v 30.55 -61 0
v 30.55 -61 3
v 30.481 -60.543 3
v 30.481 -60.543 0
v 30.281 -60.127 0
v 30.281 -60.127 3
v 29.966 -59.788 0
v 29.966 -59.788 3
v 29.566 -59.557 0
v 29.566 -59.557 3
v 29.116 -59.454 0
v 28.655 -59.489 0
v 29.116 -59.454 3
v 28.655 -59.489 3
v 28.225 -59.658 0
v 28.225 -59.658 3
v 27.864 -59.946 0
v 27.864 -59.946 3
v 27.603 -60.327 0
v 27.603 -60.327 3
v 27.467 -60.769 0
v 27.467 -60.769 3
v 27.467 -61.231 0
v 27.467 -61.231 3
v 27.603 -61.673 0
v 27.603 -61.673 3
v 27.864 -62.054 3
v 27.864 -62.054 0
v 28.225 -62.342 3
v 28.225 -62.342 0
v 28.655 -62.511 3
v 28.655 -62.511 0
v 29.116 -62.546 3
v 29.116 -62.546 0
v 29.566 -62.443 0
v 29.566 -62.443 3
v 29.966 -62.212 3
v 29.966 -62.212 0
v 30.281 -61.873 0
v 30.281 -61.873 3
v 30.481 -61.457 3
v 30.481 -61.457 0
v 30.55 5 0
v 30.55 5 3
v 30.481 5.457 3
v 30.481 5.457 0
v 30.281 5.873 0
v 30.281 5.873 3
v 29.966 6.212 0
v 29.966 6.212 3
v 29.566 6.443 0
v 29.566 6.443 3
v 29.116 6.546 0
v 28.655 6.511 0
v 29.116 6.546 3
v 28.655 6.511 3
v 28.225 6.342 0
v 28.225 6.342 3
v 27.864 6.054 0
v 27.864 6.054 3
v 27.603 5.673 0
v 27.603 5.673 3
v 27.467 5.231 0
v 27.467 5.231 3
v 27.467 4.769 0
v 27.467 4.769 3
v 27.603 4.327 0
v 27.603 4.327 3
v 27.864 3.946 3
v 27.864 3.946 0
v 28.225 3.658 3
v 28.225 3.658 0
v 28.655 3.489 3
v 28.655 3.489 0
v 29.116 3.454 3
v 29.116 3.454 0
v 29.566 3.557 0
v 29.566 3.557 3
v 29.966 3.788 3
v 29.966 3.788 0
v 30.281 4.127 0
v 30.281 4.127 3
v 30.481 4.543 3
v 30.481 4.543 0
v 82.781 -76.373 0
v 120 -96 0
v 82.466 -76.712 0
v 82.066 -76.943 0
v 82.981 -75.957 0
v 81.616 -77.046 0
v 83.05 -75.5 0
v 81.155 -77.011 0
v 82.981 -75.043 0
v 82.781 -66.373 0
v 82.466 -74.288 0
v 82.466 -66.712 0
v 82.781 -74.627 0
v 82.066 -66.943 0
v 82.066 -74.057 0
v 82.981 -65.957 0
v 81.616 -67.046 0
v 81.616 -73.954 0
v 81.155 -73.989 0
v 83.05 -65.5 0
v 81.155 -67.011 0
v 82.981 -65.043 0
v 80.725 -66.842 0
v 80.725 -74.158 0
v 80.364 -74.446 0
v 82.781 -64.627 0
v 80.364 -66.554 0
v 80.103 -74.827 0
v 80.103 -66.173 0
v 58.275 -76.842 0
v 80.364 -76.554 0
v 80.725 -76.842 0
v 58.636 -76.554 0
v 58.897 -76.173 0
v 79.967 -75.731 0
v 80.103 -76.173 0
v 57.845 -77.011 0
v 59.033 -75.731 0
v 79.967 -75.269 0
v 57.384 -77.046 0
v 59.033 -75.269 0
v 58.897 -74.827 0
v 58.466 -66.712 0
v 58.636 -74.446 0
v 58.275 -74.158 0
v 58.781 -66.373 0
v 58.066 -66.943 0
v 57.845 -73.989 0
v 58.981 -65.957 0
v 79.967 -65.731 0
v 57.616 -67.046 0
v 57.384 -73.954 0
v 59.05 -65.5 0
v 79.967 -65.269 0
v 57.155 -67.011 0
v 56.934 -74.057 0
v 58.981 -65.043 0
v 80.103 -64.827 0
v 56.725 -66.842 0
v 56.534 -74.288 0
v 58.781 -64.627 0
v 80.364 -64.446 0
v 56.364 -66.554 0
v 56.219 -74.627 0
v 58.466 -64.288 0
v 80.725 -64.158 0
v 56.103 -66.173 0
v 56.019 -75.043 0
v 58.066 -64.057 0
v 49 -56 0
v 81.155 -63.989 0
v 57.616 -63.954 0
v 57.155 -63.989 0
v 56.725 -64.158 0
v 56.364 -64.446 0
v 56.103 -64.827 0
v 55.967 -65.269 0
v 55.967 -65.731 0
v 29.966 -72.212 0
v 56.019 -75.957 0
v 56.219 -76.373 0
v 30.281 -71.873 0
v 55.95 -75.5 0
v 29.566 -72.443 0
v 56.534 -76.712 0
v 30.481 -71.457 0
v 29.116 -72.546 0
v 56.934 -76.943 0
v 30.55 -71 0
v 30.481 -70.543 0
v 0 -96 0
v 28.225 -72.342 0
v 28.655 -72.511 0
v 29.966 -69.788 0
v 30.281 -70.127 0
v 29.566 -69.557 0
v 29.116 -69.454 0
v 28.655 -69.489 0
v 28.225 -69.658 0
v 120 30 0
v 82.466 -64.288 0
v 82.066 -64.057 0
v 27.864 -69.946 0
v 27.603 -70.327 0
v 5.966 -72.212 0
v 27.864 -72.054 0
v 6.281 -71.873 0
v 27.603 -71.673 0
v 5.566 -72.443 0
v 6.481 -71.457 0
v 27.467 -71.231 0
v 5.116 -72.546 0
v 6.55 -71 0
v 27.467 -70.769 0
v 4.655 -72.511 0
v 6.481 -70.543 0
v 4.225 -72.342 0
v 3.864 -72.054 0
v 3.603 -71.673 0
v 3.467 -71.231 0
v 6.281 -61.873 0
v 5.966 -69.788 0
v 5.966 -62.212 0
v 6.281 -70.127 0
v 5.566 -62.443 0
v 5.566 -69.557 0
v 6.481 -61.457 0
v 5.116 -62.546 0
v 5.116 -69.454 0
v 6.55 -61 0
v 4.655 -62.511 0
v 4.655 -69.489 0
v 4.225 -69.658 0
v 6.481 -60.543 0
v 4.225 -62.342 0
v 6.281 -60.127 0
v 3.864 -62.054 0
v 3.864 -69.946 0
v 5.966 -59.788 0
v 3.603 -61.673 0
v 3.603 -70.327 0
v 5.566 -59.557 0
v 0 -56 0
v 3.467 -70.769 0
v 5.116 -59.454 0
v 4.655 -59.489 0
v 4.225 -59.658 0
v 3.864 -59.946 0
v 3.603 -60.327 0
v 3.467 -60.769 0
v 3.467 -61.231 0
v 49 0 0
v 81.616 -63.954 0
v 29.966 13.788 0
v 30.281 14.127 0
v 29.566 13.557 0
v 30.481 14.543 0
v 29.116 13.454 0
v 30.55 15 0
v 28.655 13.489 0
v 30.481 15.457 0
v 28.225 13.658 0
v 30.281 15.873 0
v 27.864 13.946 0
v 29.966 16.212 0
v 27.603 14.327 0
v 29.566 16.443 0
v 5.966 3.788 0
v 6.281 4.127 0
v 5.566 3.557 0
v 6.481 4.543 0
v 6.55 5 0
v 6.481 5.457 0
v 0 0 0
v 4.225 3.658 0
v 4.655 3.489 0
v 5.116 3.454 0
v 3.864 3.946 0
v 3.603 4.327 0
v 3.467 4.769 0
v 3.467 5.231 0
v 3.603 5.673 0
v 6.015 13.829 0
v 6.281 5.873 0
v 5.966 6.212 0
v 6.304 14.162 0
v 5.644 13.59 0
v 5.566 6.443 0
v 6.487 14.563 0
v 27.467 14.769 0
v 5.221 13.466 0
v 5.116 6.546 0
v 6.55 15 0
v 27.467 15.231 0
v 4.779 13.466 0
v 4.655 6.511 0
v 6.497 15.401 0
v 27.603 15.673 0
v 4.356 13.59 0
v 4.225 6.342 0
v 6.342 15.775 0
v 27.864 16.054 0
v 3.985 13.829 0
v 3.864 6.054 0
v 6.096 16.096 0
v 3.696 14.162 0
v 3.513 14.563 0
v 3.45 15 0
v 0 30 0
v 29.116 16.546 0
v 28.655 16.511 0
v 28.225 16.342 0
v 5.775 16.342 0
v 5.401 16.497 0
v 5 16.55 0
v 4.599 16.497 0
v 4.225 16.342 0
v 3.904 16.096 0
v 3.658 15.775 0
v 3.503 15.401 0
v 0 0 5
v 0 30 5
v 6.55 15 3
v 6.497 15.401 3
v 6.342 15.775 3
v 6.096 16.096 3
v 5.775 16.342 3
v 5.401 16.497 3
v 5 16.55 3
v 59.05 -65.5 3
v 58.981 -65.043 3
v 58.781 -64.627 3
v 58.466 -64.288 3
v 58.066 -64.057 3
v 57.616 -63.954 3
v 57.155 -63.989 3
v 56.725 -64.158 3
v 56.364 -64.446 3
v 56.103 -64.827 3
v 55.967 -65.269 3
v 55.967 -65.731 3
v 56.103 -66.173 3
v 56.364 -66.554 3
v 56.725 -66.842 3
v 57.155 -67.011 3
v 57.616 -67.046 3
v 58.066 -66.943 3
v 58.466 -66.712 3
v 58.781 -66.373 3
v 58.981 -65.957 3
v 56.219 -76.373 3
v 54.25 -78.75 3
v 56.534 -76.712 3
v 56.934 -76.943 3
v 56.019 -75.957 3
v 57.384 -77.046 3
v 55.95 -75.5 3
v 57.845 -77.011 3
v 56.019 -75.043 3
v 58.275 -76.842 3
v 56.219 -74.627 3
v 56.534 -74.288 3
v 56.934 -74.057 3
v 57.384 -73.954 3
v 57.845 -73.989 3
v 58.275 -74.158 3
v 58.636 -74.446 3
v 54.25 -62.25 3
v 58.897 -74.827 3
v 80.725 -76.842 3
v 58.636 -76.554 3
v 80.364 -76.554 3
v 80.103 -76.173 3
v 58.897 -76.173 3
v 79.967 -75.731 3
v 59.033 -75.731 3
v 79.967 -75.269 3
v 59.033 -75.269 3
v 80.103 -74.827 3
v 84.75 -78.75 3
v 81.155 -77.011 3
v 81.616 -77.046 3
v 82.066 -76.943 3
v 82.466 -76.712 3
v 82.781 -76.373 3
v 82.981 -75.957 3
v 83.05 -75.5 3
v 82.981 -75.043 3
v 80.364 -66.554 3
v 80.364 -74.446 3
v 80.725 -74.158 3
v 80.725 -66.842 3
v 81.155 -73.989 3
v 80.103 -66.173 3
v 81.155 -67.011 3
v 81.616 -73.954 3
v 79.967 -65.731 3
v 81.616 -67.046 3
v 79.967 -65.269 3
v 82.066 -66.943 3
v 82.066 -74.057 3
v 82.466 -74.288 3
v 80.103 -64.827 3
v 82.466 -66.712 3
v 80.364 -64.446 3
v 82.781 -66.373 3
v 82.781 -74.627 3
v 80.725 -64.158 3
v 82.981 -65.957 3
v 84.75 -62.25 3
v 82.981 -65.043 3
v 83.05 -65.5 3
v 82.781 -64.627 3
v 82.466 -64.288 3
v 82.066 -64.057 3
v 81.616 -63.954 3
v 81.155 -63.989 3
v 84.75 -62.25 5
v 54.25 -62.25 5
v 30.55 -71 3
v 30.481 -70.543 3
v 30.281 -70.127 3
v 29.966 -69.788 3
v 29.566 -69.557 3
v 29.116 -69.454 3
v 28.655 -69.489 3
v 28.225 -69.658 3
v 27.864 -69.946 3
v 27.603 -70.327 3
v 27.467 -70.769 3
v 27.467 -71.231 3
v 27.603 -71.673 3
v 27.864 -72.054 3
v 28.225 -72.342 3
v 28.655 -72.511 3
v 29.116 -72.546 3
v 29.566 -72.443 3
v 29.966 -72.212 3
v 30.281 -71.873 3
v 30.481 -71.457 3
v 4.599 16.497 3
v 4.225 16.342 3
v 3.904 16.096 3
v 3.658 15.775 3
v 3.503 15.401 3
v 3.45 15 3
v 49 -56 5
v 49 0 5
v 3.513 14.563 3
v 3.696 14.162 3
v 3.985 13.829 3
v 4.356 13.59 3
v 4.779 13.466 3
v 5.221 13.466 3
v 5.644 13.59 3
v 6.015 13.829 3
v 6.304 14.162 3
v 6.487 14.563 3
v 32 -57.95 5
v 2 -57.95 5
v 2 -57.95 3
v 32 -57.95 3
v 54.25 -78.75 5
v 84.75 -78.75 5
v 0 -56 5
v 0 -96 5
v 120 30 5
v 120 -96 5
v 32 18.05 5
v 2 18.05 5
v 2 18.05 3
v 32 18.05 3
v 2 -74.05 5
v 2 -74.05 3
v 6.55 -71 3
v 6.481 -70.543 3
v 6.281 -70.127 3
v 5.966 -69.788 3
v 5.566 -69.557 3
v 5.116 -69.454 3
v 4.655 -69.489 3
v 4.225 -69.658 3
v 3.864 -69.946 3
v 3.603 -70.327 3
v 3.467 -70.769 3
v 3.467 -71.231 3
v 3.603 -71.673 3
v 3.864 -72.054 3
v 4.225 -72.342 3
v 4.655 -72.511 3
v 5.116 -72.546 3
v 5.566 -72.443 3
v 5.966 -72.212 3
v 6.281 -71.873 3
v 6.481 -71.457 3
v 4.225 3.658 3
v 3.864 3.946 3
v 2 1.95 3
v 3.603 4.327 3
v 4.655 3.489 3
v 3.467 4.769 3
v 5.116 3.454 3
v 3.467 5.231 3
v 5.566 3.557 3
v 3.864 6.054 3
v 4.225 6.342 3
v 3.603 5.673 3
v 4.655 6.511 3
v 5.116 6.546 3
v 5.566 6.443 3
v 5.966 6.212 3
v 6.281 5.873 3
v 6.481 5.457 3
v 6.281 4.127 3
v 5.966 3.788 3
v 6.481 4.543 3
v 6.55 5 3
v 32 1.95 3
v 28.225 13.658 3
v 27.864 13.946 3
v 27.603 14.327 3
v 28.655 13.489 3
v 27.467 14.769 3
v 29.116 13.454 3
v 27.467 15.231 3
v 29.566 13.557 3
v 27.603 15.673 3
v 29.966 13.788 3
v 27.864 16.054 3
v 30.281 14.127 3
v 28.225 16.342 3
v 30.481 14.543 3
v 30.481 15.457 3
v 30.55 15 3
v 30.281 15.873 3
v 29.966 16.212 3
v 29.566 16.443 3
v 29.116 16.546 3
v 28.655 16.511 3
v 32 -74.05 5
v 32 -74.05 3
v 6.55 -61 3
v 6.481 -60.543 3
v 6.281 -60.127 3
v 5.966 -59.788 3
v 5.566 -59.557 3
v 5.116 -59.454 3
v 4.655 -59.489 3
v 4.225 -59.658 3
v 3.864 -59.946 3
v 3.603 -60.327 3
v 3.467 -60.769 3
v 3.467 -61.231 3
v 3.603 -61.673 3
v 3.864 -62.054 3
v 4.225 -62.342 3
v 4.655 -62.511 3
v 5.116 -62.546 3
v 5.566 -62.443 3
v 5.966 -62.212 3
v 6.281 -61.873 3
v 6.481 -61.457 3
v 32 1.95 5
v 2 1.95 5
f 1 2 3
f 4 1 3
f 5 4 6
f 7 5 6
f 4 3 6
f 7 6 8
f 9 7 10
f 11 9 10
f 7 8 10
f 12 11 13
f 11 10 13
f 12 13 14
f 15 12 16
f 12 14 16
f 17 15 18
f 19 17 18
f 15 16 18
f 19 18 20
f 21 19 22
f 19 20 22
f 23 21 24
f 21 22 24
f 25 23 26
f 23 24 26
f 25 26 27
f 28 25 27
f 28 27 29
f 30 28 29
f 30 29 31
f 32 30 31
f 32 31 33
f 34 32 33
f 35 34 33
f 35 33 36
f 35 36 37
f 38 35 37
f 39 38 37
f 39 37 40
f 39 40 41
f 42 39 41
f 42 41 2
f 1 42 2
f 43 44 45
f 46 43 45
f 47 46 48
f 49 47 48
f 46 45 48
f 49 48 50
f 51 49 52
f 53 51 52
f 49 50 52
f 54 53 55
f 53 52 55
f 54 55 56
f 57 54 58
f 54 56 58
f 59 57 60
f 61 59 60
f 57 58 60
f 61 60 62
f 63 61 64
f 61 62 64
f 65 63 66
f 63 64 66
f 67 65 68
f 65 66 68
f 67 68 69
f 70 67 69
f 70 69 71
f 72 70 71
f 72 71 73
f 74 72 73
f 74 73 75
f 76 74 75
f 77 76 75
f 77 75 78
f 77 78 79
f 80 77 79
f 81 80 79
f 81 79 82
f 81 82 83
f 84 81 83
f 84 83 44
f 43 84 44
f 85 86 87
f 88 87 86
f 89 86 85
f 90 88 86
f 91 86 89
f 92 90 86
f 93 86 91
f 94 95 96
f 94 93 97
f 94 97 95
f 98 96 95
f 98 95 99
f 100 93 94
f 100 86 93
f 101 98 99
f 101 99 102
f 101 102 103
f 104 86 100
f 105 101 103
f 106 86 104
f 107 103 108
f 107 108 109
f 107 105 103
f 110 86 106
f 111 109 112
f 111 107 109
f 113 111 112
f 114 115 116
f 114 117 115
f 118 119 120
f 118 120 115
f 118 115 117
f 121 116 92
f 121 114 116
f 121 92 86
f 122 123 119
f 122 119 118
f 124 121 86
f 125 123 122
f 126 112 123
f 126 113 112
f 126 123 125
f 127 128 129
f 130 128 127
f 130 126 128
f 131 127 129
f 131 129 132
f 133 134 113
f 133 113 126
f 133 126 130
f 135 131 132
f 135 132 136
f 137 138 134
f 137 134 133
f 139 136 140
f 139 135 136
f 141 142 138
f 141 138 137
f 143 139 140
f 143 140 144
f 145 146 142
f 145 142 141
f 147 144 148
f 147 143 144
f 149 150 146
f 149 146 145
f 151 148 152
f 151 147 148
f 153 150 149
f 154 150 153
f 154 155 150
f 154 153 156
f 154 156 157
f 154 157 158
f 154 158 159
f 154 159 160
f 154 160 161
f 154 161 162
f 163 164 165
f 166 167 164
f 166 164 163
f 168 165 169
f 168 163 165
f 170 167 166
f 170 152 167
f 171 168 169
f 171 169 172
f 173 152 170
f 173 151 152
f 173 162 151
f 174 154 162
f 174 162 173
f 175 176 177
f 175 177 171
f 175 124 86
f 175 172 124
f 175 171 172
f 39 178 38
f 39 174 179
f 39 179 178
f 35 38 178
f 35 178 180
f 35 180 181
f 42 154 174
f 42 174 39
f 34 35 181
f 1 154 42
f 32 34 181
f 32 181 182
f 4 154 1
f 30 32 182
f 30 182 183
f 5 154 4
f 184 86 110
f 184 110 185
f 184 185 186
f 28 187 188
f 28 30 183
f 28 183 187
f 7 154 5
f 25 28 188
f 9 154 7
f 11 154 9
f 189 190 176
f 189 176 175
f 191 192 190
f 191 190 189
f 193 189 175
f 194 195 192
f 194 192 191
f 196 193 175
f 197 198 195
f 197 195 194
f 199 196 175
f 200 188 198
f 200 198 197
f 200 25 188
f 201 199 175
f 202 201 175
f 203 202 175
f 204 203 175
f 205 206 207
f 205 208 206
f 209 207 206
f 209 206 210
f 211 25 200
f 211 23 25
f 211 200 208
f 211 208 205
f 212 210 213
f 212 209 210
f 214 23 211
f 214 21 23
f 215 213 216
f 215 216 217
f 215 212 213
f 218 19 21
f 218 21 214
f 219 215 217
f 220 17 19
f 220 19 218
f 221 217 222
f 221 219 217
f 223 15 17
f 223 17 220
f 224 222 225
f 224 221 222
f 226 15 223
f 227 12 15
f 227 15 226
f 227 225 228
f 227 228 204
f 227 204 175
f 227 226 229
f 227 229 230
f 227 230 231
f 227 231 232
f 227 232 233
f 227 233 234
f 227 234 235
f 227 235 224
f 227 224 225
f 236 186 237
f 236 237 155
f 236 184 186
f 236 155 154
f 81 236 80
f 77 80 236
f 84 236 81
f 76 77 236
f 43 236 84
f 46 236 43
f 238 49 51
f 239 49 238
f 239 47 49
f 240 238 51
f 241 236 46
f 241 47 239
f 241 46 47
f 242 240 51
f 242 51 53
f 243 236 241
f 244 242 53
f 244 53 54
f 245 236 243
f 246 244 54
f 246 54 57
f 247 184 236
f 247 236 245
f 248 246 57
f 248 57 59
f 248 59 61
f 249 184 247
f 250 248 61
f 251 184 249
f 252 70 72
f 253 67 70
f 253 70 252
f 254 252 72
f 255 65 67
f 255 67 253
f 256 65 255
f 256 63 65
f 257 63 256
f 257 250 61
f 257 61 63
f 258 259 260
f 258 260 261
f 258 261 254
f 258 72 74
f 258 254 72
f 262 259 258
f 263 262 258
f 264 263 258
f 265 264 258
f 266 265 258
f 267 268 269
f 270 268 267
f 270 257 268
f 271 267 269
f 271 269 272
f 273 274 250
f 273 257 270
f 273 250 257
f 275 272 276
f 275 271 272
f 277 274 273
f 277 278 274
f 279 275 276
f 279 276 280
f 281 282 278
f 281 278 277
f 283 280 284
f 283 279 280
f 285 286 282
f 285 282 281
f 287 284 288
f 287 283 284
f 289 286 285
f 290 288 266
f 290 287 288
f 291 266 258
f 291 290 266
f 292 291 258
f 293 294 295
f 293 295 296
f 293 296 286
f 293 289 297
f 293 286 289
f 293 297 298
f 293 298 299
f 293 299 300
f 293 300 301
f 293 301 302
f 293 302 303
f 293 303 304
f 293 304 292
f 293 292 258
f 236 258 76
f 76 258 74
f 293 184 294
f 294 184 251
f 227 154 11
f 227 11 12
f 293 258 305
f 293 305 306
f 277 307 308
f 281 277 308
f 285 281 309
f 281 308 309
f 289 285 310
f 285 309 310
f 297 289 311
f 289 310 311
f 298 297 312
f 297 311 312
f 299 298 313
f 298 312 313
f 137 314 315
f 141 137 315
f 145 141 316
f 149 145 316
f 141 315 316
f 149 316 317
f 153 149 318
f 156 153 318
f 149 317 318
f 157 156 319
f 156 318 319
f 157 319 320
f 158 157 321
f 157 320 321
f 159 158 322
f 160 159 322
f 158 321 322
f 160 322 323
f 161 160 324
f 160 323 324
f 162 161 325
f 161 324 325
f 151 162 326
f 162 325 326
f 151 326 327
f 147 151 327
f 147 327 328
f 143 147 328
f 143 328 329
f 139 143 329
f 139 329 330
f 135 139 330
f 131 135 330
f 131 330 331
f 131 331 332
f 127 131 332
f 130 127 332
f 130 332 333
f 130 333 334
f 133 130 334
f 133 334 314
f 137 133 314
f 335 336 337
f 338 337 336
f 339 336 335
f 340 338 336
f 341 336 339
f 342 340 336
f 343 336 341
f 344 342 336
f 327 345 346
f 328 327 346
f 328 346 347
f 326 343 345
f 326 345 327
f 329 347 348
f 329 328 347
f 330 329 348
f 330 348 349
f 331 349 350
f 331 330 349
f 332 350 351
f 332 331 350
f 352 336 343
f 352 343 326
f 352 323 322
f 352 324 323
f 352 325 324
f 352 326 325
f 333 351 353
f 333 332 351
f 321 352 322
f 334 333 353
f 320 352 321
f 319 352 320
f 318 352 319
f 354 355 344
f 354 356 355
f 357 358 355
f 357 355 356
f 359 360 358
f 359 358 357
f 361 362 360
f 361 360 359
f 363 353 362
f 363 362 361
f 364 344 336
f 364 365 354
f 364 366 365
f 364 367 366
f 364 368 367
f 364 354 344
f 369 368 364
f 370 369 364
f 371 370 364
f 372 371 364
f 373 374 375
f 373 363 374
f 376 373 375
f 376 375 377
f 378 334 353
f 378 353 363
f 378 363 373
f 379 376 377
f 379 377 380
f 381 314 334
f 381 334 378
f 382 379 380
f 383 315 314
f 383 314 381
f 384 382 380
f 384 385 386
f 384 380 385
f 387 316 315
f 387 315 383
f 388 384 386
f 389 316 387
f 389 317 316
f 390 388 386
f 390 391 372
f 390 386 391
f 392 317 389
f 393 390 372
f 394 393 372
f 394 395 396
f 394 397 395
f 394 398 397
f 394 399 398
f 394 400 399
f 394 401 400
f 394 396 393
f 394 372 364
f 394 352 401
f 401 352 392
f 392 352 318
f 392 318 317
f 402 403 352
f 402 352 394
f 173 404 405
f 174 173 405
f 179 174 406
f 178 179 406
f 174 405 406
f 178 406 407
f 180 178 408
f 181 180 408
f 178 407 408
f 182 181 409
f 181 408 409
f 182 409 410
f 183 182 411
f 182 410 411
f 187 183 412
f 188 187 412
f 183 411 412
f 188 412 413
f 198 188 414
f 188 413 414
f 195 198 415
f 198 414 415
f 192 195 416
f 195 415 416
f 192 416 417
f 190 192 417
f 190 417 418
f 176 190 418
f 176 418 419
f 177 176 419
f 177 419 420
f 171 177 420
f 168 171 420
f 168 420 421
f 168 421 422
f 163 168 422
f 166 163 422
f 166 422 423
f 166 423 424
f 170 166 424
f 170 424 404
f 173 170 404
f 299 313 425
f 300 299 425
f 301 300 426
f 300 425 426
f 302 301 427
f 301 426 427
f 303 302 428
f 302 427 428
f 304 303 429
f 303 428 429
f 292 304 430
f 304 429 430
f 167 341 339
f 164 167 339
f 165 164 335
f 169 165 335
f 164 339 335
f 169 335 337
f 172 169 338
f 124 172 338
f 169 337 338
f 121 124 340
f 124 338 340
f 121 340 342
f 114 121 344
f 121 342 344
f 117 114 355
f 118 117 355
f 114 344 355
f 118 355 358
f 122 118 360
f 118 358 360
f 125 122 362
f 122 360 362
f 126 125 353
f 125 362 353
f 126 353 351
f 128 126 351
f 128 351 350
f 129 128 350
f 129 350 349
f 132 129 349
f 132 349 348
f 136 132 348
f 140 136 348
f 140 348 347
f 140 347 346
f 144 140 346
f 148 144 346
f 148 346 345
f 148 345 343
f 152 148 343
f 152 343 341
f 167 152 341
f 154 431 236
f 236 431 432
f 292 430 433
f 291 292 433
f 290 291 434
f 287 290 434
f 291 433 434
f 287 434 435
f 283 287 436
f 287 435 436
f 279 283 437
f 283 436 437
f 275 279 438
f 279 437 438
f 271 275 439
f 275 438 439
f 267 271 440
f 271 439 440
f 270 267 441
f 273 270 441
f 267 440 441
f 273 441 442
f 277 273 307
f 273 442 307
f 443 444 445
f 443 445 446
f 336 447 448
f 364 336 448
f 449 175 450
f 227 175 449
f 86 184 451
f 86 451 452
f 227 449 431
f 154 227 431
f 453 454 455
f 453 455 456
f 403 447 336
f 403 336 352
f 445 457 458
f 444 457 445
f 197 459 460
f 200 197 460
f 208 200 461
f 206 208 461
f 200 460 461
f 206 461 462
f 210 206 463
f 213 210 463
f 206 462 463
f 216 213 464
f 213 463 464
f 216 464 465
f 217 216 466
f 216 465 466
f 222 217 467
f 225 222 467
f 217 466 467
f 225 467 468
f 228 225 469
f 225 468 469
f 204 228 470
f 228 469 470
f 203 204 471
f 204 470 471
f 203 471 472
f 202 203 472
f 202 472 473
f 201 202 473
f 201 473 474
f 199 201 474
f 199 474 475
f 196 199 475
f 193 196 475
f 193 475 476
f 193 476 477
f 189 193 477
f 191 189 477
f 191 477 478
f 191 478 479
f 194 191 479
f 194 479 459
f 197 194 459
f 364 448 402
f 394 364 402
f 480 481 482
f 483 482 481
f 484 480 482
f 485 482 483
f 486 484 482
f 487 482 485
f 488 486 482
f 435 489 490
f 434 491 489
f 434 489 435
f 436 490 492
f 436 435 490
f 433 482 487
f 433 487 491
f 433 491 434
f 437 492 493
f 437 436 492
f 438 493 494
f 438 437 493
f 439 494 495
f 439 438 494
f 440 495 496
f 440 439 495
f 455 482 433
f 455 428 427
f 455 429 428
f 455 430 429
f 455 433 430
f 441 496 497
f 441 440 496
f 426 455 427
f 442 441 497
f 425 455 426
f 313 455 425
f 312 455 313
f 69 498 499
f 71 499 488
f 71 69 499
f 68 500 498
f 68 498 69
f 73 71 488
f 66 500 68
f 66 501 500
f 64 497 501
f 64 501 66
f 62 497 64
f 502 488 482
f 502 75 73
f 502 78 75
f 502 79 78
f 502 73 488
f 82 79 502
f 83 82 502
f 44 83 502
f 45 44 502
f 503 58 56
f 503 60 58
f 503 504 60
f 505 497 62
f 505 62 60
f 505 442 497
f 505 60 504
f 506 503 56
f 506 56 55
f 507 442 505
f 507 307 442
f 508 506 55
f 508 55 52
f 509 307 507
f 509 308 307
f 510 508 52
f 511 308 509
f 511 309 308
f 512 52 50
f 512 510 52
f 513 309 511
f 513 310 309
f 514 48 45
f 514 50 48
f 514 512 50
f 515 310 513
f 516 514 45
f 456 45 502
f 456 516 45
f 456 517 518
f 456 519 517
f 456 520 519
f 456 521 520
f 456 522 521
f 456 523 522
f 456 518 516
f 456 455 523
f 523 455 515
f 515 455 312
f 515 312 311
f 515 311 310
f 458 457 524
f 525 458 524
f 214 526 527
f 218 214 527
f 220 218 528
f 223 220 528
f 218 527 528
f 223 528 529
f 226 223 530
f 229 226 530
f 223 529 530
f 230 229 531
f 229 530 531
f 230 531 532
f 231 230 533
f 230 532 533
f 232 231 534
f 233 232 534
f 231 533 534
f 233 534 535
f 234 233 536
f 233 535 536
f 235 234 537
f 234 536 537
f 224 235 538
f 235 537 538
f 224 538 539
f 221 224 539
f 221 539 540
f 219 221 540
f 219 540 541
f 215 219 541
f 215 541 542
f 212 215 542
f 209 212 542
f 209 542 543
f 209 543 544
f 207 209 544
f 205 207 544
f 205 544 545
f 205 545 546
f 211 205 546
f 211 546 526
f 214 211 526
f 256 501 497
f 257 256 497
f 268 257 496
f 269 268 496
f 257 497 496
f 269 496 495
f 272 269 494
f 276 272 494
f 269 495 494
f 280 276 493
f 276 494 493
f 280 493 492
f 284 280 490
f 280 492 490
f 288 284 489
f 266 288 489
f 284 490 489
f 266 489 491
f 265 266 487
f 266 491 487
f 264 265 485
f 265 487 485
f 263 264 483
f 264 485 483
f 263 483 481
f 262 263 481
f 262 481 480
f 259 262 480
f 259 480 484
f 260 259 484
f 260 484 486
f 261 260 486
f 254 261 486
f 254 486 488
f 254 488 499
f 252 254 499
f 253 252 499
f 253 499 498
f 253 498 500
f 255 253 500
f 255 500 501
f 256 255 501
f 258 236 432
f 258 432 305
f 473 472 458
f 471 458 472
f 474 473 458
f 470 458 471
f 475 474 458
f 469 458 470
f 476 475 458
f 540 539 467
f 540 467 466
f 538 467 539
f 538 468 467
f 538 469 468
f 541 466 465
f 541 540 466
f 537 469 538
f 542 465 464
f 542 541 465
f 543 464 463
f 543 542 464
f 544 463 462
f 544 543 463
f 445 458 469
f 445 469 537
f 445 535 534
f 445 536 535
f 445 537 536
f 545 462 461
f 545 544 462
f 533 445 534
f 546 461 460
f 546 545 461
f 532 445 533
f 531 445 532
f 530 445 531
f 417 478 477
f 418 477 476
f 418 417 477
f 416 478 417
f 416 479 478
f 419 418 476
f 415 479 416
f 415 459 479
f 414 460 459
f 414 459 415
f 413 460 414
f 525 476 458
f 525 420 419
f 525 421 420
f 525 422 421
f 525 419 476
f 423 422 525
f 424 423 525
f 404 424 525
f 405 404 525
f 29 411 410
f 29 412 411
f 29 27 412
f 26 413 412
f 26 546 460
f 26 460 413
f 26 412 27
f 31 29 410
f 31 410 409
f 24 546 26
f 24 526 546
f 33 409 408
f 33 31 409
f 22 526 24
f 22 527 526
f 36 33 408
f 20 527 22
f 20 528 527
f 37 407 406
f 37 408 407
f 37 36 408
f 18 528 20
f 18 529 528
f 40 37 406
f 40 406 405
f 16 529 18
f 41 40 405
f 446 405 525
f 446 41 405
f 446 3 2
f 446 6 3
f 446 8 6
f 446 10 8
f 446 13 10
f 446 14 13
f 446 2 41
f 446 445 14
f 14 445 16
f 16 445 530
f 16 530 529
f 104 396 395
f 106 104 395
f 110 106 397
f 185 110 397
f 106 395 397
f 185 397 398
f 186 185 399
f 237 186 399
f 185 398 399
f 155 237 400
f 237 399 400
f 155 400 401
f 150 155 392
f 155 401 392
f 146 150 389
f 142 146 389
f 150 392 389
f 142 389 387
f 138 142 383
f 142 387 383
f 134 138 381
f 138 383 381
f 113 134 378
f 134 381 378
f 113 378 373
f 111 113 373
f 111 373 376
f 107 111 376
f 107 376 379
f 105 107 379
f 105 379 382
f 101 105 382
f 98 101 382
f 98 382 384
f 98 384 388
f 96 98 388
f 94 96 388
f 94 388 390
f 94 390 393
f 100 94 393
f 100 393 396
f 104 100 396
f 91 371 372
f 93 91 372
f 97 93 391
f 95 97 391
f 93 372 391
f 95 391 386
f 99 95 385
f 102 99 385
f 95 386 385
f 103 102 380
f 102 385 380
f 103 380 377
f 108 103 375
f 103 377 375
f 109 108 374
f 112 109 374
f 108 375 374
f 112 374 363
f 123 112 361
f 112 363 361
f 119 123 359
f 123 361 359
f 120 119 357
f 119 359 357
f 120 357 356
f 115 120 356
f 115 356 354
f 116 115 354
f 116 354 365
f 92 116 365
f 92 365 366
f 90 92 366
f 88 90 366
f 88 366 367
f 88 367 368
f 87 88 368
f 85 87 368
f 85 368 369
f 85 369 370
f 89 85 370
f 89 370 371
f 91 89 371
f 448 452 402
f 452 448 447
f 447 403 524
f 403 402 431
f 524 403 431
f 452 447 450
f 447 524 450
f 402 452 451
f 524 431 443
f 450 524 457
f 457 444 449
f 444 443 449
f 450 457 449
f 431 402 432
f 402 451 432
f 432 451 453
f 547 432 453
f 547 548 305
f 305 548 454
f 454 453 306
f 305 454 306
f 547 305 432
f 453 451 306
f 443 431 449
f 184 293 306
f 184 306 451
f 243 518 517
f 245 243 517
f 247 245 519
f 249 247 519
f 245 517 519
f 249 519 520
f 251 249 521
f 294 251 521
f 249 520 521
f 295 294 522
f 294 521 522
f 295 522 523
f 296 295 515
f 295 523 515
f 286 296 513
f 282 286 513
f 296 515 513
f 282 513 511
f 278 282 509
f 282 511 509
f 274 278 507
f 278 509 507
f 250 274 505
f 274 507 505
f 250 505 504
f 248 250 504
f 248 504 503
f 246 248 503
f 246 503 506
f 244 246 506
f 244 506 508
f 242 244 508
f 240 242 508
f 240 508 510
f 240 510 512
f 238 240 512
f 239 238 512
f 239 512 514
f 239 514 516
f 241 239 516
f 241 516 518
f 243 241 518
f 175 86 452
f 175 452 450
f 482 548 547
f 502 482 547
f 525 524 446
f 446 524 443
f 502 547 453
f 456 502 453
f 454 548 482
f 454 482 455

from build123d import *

# Parameters (mm, degrees)
EXTRUDE_2_DEPTH     = 5
SKETCH_3_W          = 30
SKETCH_3_H          = 16.1
CUT_EXTRUDE_1_DEPTH = 2
CUT_EXTRUDE_2_REACH = 155.704
SKETCH_4_R          = 1.55
CUT_EXTRUDE_3_REACH = 155.756
SKETCH_5_W          = 32
SKETCH_5_H          = 56
SKETCH_7_W          = 40.5
SKETCH_7_H          = 40.5
EXTRUDE_4_DEPTH     = 2
SKETCH_8_W          = 30.5
SKETCH_8_H          = 16.5
CUT_EXTRUDE_4_DEPTH = 2
SKETCH_9_R          = 1.55
CUT_EXTRUDE_6_DEPTH = 154.727030805
SKETCH_10_W         = 60
SKETCH_10_H         = 45
EXTRUDE_5_DEPTH     = 2
SKETCH_11_W         = 60
SKETCH_11_H         = 45
CUT_EXTRUDE_8_DEPTH = 2


with BuildPart() as part:
    # 草图1 → 凸台-拉伸2 (new body)
    with BuildSketch(Plane.XY):
        Polygon((0, 0), (0, 30), (120, 30), (120, -96), (0, -96), (0, -56), (45, -56), (45, 0), align=None)
    extrude(amount=EXTRUDE_2_DEPTH)

    # 草图3 → 切除-拉伸1 (cut)
    with BuildSketch(Plane.XY.offset(5)):
        with Locations((17, 10)):
            Rectangle(SKETCH_3_W, SKETCH_3_H)
        with Locations((17, -66)):
            Rectangle(SKETCH_3_W, SKETCH_3_H)
    extrude(amount=-CUT_EXTRUDE_1_DEPTH, mode=Mode.SUBTRACT)

    # 草图4 → 切除-拉伸2 (cut, up to next)
    with BuildSketch(Plane.XY.offset(3), mode=Mode.PRIVATE) as cut_extrude_2_sk1:
        with Locations((29, 15)):
            Circle(SKETCH_4_R)
    cut_extrude_2_tool1 = extrude(cut_extrude_2_sk1.sketch, amount=-CUT_EXTRUDE_2_REACH, mode=Mode.PRIVATE) & part.part
    # 草图4 → 切除-拉伸2 (cut, up to next)
    with BuildSketch(Plane.XY.offset(3), mode=Mode.PRIVATE) as cut_extrude_2_sk2:
        with Locations((29, 5)):
            Circle(SKETCH_4_R)
    cut_extrude_2_tool2 = extrude(cut_extrude_2_sk2.sketch, amount=-CUT_EXTRUDE_2_REACH, mode=Mode.PRIVATE) & part.part
    # 草图4 → 切除-拉伸2 (cut, up to next)
    with BuildSketch(Plane.XY.offset(3), mode=Mode.PRIVATE) as cut_extrude_2_sk3:
        with BuildLine():
            ThreePointArc((5, 16.55), (3.903984489, 16.096015511), (3.45, 15))
            Line((3.45, 15), (5, 15))
            Line((5, 15), (5, 16.55))
        make_face()
    cut_extrude_2_tool3 = extrude(cut_extrude_2_sk3.sketch, amount=-CUT_EXTRUDE_2_REACH, mode=Mode.PRIVATE) & part.part
    # 草图4 → 切除-拉伸2 (cut, up to next)
    with BuildSketch(Plane.XY.offset(3), mode=Mode.PRIVATE) as cut_extrude_2_sk4:
        with BuildLine():
            Line((5, 15), (3.45, 15))
            ThreePointArc((3.45, 15), (5, 13.45), (6.55, 15))
            ThreePointArc((6.55, 15), (6.096015511, 16.096015511), (5, 16.55))
            Line((5, 16.55), (5, 15))
        make_face()
    cut_extrude_2_tool4 = extrude(cut_extrude_2_sk4.sketch, amount=-CUT_EXTRUDE_2_REACH, mode=Mode.PRIVATE) & part.part
    # 草图4 → 切除-拉伸2 (cut, up to next)
    with BuildSketch(Plane.XY.offset(3), mode=Mode.PRIVATE) as cut_extrude_2_sk5:
        with BuildLine():
            ThreePointArc((5, 16.55), (3.903984489, 16.096015511), (3.45, 15))
            Line((3.45, 15), (5, 15))
            Line((5, 15), (5, 16.55))
        make_face()
    cut_extrude_2_tool5 = extrude(cut_extrude_2_sk5.sketch, amount=-CUT_EXTRUDE_2_REACH, mode=Mode.PRIVATE) & part.part
    # 草图4 → 切除-拉伸2 (cut, up to next)
    with BuildSketch(Plane.XY.offset(3), mode=Mode.PRIVATE) as cut_extrude_2_sk6:
        with BuildLine():
            Line((5, 15), (3.45, 15))
            ThreePointArc((3.45, 15), (5, 13.45), (6.55, 15))
            ThreePointArc((6.55, 15), (6.096015511, 16.096015511), (5, 16.55))
            Line((5, 16.55), (5, 15))
        make_face()
    cut_extrude_2_tool6 = extrude(cut_extrude_2_sk6.sketch, amount=-CUT_EXTRUDE_2_REACH, mode=Mode.PRIVATE) & part.part
    # 草图4 → 切除-拉伸2 (cut, up to next)
    with BuildSketch(Plane.XY.offset(3), mode=Mode.PRIVATE) as cut_extrude_2_sk7:
        with Locations((5, 5)):
            Circle(SKETCH_4_R)
    cut_extrude_2_tool7 = extrude(cut_extrude_2_sk7.sketch, amount=-CUT_EXTRUDE_2_REACH, mode=Mode.PRIVATE) & part.part
    # 草图4 → 切除-拉伸2 (cut, up to next)
    with BuildSketch(Plane.XY.offset(3), mode=Mode.PRIVATE) as cut_extrude_2_sk8:
        with Locations((5, -61)):
            Circle(SKETCH_4_R)
    cut_extrude_2_tool8 = extrude(cut_extrude_2_sk8.sketch, amount=-CUT_EXTRUDE_2_REACH, mode=Mode.PRIVATE) & part.part
    # 草图4 → 切除-拉伸2 (cut, up to next)
    with BuildSketch(Plane.XY.offset(3), mode=Mode.PRIVATE) as cut_extrude_2_sk9:
        with Locations((5, -71)):
            Circle(SKETCH_4_R)
    cut_extrude_2_tool9 = extrude(cut_extrude_2_sk9.sketch, amount=-CUT_EXTRUDE_2_REACH, mode=Mode.PRIVATE) & part.part
    # 草图4 → 切除-拉伸2 (cut, up to next)
    with BuildSketch(Plane.XY.offset(3), mode=Mode.PRIVATE) as cut_extrude_2_sk10:
        with Locations((29, -61)):
            Circle(SKETCH_4_R)
    cut_extrude_2_tool10 = extrude(cut_extrude_2_sk10.sketch, amount=-CUT_EXTRUDE_2_REACH, mode=Mode.PRIVATE) & part.part
    # 草图4 → 切除-拉伸2 (cut, up to next)
    with BuildSketch(Plane.XY.offset(3), mode=Mode.PRIVATE) as cut_extrude_2_sk11:
        with Locations((29, -71)):
            Circle(SKETCH_4_R)
    cut_extrude_2_tool11 = extrude(cut_extrude_2_sk11.sketch, amount=-CUT_EXTRUDE_2_REACH, mode=Mode.PRIVATE) & part.part
    add(cut_extrude_2_tool1.solids().sort_by_distance((29, 15, 3))[0], mode=Mode.SUBTRACT)
    add(cut_extrude_2_tool2.solids().sort_by_distance((29, 5, 3))[0], mode=Mode.SUBTRACT)
    add(cut_extrude_2_tool3.solids().sort_by_distance((4.34216, 15.65784, 3))[0], mode=Mode.SUBTRACT)
    add(cut_extrude_2_tool4.solids().sort_by_distance((5.21928, 14.78072, 3))[0], mode=Mode.SUBTRACT)
    add(cut_extrude_2_tool5.solids().sort_by_distance((4.34216, 15.65784, 3))[0], mode=Mode.SUBTRACT)
    add(cut_extrude_2_tool6.solids().sort_by_distance((5.21928, 14.78072, 3))[0], mode=Mode.SUBTRACT)
    add(cut_extrude_2_tool7.solids().sort_by_distance((5, 5, 3))[0], mode=Mode.SUBTRACT)
    add(cut_extrude_2_tool8.solids().sort_by_distance((5, -61, 3))[0], mode=Mode.SUBTRACT)
    add(cut_extrude_2_tool9.solids().sort_by_distance((5, -71, 3))[0], mode=Mode.SUBTRACT)
    add(cut_extrude_2_tool10.solids().sort_by_distance((29, -61, 3))[0], mode=Mode.SUBTRACT)
    add(cut_extrude_2_tool11.solids().sort_by_distance((29, -71, 3))[0], mode=Mode.SUBTRACT)

    # 草图5 → 切除-拉伸3 (cut, up to next)
    with BuildSketch(Plane.XY.offset(5), mode=Mode.PRIVATE) as cut_extrude_3_sk1:
        with Locations((33, -28)):
            Rectangle(SKETCH_5_W, SKETCH_5_H)
    cut_extrude_3_tool1 = extrude(cut_extrude_3_sk1.sketch, amount=-CUT_EXTRUDE_3_REACH, mode=Mode.PRIVATE) & part.part
    add(cut_extrude_3_tool1.solids().sort_by_distance((33, -28, 5))[0], mode=Mode.SUBTRACT)

    # 草图7 → 凸台-拉伸4 (add)
    with BuildSketch(Plane.XY.offset(5)):
        with Locations((79.25, -35.75)):
            Rectangle(SKETCH_7_W, SKETCH_7_H)
    extrude(amount=EXTRUDE_4_DEPTH)

    # 草图8 → 切除-拉伸4 (cut)
    with BuildSketch(Plane.XY.offset(5)):
        with Locations((69.5, -70.5)):
            Rectangle(SKETCH_8_W, SKETCH_8_H)
    extrude(amount=-CUT_EXTRUDE_4_DEPTH, mode=Mode.SUBTRACT)

    # 草图9 → 切除-拉伸6 (cut, through all)
    with BuildSketch(Plane.XY.offset(3)):
        with Locations((81.5, -65.5)):
            Circle(SKETCH_9_R)
        with Locations((57.5, -65.5)):
            Circle(SKETCH_9_R)
        with Locations(Location((57.5, -75.5, 0), (0, 0, 180))):
            Circle(SKETCH_9_R)
        with Locations((81.5, -75.5)):
            Circle(SKETCH_9_R)
    extrude(amount=-CUT_EXTRUDE_6_DEPTH, mode=Mode.SUBTRACT)

    # 草图10 → 凸台-拉伸5 (add)
    with BuildSketch(Plane.XY.offset(7)):
        with Locations((89, -33.5)):
            Rectangle(SKETCH_10_W, SKETCH_10_H)
    extrude(amount=-EXTRUDE_5_DEPTH)

    # 草图11 → 切除-拉伸8 (cut)
    with BuildSketch(Plane.XY.offset(5)):
        with Locations((89, -33.5)):
            Rectangle(SKETCH_11_W, SKETCH_11_H)
    extrude(amount=CUT_EXTRUDE_8_DEPTH, mode=Mode.SUBTRACT)


solid = part.part
